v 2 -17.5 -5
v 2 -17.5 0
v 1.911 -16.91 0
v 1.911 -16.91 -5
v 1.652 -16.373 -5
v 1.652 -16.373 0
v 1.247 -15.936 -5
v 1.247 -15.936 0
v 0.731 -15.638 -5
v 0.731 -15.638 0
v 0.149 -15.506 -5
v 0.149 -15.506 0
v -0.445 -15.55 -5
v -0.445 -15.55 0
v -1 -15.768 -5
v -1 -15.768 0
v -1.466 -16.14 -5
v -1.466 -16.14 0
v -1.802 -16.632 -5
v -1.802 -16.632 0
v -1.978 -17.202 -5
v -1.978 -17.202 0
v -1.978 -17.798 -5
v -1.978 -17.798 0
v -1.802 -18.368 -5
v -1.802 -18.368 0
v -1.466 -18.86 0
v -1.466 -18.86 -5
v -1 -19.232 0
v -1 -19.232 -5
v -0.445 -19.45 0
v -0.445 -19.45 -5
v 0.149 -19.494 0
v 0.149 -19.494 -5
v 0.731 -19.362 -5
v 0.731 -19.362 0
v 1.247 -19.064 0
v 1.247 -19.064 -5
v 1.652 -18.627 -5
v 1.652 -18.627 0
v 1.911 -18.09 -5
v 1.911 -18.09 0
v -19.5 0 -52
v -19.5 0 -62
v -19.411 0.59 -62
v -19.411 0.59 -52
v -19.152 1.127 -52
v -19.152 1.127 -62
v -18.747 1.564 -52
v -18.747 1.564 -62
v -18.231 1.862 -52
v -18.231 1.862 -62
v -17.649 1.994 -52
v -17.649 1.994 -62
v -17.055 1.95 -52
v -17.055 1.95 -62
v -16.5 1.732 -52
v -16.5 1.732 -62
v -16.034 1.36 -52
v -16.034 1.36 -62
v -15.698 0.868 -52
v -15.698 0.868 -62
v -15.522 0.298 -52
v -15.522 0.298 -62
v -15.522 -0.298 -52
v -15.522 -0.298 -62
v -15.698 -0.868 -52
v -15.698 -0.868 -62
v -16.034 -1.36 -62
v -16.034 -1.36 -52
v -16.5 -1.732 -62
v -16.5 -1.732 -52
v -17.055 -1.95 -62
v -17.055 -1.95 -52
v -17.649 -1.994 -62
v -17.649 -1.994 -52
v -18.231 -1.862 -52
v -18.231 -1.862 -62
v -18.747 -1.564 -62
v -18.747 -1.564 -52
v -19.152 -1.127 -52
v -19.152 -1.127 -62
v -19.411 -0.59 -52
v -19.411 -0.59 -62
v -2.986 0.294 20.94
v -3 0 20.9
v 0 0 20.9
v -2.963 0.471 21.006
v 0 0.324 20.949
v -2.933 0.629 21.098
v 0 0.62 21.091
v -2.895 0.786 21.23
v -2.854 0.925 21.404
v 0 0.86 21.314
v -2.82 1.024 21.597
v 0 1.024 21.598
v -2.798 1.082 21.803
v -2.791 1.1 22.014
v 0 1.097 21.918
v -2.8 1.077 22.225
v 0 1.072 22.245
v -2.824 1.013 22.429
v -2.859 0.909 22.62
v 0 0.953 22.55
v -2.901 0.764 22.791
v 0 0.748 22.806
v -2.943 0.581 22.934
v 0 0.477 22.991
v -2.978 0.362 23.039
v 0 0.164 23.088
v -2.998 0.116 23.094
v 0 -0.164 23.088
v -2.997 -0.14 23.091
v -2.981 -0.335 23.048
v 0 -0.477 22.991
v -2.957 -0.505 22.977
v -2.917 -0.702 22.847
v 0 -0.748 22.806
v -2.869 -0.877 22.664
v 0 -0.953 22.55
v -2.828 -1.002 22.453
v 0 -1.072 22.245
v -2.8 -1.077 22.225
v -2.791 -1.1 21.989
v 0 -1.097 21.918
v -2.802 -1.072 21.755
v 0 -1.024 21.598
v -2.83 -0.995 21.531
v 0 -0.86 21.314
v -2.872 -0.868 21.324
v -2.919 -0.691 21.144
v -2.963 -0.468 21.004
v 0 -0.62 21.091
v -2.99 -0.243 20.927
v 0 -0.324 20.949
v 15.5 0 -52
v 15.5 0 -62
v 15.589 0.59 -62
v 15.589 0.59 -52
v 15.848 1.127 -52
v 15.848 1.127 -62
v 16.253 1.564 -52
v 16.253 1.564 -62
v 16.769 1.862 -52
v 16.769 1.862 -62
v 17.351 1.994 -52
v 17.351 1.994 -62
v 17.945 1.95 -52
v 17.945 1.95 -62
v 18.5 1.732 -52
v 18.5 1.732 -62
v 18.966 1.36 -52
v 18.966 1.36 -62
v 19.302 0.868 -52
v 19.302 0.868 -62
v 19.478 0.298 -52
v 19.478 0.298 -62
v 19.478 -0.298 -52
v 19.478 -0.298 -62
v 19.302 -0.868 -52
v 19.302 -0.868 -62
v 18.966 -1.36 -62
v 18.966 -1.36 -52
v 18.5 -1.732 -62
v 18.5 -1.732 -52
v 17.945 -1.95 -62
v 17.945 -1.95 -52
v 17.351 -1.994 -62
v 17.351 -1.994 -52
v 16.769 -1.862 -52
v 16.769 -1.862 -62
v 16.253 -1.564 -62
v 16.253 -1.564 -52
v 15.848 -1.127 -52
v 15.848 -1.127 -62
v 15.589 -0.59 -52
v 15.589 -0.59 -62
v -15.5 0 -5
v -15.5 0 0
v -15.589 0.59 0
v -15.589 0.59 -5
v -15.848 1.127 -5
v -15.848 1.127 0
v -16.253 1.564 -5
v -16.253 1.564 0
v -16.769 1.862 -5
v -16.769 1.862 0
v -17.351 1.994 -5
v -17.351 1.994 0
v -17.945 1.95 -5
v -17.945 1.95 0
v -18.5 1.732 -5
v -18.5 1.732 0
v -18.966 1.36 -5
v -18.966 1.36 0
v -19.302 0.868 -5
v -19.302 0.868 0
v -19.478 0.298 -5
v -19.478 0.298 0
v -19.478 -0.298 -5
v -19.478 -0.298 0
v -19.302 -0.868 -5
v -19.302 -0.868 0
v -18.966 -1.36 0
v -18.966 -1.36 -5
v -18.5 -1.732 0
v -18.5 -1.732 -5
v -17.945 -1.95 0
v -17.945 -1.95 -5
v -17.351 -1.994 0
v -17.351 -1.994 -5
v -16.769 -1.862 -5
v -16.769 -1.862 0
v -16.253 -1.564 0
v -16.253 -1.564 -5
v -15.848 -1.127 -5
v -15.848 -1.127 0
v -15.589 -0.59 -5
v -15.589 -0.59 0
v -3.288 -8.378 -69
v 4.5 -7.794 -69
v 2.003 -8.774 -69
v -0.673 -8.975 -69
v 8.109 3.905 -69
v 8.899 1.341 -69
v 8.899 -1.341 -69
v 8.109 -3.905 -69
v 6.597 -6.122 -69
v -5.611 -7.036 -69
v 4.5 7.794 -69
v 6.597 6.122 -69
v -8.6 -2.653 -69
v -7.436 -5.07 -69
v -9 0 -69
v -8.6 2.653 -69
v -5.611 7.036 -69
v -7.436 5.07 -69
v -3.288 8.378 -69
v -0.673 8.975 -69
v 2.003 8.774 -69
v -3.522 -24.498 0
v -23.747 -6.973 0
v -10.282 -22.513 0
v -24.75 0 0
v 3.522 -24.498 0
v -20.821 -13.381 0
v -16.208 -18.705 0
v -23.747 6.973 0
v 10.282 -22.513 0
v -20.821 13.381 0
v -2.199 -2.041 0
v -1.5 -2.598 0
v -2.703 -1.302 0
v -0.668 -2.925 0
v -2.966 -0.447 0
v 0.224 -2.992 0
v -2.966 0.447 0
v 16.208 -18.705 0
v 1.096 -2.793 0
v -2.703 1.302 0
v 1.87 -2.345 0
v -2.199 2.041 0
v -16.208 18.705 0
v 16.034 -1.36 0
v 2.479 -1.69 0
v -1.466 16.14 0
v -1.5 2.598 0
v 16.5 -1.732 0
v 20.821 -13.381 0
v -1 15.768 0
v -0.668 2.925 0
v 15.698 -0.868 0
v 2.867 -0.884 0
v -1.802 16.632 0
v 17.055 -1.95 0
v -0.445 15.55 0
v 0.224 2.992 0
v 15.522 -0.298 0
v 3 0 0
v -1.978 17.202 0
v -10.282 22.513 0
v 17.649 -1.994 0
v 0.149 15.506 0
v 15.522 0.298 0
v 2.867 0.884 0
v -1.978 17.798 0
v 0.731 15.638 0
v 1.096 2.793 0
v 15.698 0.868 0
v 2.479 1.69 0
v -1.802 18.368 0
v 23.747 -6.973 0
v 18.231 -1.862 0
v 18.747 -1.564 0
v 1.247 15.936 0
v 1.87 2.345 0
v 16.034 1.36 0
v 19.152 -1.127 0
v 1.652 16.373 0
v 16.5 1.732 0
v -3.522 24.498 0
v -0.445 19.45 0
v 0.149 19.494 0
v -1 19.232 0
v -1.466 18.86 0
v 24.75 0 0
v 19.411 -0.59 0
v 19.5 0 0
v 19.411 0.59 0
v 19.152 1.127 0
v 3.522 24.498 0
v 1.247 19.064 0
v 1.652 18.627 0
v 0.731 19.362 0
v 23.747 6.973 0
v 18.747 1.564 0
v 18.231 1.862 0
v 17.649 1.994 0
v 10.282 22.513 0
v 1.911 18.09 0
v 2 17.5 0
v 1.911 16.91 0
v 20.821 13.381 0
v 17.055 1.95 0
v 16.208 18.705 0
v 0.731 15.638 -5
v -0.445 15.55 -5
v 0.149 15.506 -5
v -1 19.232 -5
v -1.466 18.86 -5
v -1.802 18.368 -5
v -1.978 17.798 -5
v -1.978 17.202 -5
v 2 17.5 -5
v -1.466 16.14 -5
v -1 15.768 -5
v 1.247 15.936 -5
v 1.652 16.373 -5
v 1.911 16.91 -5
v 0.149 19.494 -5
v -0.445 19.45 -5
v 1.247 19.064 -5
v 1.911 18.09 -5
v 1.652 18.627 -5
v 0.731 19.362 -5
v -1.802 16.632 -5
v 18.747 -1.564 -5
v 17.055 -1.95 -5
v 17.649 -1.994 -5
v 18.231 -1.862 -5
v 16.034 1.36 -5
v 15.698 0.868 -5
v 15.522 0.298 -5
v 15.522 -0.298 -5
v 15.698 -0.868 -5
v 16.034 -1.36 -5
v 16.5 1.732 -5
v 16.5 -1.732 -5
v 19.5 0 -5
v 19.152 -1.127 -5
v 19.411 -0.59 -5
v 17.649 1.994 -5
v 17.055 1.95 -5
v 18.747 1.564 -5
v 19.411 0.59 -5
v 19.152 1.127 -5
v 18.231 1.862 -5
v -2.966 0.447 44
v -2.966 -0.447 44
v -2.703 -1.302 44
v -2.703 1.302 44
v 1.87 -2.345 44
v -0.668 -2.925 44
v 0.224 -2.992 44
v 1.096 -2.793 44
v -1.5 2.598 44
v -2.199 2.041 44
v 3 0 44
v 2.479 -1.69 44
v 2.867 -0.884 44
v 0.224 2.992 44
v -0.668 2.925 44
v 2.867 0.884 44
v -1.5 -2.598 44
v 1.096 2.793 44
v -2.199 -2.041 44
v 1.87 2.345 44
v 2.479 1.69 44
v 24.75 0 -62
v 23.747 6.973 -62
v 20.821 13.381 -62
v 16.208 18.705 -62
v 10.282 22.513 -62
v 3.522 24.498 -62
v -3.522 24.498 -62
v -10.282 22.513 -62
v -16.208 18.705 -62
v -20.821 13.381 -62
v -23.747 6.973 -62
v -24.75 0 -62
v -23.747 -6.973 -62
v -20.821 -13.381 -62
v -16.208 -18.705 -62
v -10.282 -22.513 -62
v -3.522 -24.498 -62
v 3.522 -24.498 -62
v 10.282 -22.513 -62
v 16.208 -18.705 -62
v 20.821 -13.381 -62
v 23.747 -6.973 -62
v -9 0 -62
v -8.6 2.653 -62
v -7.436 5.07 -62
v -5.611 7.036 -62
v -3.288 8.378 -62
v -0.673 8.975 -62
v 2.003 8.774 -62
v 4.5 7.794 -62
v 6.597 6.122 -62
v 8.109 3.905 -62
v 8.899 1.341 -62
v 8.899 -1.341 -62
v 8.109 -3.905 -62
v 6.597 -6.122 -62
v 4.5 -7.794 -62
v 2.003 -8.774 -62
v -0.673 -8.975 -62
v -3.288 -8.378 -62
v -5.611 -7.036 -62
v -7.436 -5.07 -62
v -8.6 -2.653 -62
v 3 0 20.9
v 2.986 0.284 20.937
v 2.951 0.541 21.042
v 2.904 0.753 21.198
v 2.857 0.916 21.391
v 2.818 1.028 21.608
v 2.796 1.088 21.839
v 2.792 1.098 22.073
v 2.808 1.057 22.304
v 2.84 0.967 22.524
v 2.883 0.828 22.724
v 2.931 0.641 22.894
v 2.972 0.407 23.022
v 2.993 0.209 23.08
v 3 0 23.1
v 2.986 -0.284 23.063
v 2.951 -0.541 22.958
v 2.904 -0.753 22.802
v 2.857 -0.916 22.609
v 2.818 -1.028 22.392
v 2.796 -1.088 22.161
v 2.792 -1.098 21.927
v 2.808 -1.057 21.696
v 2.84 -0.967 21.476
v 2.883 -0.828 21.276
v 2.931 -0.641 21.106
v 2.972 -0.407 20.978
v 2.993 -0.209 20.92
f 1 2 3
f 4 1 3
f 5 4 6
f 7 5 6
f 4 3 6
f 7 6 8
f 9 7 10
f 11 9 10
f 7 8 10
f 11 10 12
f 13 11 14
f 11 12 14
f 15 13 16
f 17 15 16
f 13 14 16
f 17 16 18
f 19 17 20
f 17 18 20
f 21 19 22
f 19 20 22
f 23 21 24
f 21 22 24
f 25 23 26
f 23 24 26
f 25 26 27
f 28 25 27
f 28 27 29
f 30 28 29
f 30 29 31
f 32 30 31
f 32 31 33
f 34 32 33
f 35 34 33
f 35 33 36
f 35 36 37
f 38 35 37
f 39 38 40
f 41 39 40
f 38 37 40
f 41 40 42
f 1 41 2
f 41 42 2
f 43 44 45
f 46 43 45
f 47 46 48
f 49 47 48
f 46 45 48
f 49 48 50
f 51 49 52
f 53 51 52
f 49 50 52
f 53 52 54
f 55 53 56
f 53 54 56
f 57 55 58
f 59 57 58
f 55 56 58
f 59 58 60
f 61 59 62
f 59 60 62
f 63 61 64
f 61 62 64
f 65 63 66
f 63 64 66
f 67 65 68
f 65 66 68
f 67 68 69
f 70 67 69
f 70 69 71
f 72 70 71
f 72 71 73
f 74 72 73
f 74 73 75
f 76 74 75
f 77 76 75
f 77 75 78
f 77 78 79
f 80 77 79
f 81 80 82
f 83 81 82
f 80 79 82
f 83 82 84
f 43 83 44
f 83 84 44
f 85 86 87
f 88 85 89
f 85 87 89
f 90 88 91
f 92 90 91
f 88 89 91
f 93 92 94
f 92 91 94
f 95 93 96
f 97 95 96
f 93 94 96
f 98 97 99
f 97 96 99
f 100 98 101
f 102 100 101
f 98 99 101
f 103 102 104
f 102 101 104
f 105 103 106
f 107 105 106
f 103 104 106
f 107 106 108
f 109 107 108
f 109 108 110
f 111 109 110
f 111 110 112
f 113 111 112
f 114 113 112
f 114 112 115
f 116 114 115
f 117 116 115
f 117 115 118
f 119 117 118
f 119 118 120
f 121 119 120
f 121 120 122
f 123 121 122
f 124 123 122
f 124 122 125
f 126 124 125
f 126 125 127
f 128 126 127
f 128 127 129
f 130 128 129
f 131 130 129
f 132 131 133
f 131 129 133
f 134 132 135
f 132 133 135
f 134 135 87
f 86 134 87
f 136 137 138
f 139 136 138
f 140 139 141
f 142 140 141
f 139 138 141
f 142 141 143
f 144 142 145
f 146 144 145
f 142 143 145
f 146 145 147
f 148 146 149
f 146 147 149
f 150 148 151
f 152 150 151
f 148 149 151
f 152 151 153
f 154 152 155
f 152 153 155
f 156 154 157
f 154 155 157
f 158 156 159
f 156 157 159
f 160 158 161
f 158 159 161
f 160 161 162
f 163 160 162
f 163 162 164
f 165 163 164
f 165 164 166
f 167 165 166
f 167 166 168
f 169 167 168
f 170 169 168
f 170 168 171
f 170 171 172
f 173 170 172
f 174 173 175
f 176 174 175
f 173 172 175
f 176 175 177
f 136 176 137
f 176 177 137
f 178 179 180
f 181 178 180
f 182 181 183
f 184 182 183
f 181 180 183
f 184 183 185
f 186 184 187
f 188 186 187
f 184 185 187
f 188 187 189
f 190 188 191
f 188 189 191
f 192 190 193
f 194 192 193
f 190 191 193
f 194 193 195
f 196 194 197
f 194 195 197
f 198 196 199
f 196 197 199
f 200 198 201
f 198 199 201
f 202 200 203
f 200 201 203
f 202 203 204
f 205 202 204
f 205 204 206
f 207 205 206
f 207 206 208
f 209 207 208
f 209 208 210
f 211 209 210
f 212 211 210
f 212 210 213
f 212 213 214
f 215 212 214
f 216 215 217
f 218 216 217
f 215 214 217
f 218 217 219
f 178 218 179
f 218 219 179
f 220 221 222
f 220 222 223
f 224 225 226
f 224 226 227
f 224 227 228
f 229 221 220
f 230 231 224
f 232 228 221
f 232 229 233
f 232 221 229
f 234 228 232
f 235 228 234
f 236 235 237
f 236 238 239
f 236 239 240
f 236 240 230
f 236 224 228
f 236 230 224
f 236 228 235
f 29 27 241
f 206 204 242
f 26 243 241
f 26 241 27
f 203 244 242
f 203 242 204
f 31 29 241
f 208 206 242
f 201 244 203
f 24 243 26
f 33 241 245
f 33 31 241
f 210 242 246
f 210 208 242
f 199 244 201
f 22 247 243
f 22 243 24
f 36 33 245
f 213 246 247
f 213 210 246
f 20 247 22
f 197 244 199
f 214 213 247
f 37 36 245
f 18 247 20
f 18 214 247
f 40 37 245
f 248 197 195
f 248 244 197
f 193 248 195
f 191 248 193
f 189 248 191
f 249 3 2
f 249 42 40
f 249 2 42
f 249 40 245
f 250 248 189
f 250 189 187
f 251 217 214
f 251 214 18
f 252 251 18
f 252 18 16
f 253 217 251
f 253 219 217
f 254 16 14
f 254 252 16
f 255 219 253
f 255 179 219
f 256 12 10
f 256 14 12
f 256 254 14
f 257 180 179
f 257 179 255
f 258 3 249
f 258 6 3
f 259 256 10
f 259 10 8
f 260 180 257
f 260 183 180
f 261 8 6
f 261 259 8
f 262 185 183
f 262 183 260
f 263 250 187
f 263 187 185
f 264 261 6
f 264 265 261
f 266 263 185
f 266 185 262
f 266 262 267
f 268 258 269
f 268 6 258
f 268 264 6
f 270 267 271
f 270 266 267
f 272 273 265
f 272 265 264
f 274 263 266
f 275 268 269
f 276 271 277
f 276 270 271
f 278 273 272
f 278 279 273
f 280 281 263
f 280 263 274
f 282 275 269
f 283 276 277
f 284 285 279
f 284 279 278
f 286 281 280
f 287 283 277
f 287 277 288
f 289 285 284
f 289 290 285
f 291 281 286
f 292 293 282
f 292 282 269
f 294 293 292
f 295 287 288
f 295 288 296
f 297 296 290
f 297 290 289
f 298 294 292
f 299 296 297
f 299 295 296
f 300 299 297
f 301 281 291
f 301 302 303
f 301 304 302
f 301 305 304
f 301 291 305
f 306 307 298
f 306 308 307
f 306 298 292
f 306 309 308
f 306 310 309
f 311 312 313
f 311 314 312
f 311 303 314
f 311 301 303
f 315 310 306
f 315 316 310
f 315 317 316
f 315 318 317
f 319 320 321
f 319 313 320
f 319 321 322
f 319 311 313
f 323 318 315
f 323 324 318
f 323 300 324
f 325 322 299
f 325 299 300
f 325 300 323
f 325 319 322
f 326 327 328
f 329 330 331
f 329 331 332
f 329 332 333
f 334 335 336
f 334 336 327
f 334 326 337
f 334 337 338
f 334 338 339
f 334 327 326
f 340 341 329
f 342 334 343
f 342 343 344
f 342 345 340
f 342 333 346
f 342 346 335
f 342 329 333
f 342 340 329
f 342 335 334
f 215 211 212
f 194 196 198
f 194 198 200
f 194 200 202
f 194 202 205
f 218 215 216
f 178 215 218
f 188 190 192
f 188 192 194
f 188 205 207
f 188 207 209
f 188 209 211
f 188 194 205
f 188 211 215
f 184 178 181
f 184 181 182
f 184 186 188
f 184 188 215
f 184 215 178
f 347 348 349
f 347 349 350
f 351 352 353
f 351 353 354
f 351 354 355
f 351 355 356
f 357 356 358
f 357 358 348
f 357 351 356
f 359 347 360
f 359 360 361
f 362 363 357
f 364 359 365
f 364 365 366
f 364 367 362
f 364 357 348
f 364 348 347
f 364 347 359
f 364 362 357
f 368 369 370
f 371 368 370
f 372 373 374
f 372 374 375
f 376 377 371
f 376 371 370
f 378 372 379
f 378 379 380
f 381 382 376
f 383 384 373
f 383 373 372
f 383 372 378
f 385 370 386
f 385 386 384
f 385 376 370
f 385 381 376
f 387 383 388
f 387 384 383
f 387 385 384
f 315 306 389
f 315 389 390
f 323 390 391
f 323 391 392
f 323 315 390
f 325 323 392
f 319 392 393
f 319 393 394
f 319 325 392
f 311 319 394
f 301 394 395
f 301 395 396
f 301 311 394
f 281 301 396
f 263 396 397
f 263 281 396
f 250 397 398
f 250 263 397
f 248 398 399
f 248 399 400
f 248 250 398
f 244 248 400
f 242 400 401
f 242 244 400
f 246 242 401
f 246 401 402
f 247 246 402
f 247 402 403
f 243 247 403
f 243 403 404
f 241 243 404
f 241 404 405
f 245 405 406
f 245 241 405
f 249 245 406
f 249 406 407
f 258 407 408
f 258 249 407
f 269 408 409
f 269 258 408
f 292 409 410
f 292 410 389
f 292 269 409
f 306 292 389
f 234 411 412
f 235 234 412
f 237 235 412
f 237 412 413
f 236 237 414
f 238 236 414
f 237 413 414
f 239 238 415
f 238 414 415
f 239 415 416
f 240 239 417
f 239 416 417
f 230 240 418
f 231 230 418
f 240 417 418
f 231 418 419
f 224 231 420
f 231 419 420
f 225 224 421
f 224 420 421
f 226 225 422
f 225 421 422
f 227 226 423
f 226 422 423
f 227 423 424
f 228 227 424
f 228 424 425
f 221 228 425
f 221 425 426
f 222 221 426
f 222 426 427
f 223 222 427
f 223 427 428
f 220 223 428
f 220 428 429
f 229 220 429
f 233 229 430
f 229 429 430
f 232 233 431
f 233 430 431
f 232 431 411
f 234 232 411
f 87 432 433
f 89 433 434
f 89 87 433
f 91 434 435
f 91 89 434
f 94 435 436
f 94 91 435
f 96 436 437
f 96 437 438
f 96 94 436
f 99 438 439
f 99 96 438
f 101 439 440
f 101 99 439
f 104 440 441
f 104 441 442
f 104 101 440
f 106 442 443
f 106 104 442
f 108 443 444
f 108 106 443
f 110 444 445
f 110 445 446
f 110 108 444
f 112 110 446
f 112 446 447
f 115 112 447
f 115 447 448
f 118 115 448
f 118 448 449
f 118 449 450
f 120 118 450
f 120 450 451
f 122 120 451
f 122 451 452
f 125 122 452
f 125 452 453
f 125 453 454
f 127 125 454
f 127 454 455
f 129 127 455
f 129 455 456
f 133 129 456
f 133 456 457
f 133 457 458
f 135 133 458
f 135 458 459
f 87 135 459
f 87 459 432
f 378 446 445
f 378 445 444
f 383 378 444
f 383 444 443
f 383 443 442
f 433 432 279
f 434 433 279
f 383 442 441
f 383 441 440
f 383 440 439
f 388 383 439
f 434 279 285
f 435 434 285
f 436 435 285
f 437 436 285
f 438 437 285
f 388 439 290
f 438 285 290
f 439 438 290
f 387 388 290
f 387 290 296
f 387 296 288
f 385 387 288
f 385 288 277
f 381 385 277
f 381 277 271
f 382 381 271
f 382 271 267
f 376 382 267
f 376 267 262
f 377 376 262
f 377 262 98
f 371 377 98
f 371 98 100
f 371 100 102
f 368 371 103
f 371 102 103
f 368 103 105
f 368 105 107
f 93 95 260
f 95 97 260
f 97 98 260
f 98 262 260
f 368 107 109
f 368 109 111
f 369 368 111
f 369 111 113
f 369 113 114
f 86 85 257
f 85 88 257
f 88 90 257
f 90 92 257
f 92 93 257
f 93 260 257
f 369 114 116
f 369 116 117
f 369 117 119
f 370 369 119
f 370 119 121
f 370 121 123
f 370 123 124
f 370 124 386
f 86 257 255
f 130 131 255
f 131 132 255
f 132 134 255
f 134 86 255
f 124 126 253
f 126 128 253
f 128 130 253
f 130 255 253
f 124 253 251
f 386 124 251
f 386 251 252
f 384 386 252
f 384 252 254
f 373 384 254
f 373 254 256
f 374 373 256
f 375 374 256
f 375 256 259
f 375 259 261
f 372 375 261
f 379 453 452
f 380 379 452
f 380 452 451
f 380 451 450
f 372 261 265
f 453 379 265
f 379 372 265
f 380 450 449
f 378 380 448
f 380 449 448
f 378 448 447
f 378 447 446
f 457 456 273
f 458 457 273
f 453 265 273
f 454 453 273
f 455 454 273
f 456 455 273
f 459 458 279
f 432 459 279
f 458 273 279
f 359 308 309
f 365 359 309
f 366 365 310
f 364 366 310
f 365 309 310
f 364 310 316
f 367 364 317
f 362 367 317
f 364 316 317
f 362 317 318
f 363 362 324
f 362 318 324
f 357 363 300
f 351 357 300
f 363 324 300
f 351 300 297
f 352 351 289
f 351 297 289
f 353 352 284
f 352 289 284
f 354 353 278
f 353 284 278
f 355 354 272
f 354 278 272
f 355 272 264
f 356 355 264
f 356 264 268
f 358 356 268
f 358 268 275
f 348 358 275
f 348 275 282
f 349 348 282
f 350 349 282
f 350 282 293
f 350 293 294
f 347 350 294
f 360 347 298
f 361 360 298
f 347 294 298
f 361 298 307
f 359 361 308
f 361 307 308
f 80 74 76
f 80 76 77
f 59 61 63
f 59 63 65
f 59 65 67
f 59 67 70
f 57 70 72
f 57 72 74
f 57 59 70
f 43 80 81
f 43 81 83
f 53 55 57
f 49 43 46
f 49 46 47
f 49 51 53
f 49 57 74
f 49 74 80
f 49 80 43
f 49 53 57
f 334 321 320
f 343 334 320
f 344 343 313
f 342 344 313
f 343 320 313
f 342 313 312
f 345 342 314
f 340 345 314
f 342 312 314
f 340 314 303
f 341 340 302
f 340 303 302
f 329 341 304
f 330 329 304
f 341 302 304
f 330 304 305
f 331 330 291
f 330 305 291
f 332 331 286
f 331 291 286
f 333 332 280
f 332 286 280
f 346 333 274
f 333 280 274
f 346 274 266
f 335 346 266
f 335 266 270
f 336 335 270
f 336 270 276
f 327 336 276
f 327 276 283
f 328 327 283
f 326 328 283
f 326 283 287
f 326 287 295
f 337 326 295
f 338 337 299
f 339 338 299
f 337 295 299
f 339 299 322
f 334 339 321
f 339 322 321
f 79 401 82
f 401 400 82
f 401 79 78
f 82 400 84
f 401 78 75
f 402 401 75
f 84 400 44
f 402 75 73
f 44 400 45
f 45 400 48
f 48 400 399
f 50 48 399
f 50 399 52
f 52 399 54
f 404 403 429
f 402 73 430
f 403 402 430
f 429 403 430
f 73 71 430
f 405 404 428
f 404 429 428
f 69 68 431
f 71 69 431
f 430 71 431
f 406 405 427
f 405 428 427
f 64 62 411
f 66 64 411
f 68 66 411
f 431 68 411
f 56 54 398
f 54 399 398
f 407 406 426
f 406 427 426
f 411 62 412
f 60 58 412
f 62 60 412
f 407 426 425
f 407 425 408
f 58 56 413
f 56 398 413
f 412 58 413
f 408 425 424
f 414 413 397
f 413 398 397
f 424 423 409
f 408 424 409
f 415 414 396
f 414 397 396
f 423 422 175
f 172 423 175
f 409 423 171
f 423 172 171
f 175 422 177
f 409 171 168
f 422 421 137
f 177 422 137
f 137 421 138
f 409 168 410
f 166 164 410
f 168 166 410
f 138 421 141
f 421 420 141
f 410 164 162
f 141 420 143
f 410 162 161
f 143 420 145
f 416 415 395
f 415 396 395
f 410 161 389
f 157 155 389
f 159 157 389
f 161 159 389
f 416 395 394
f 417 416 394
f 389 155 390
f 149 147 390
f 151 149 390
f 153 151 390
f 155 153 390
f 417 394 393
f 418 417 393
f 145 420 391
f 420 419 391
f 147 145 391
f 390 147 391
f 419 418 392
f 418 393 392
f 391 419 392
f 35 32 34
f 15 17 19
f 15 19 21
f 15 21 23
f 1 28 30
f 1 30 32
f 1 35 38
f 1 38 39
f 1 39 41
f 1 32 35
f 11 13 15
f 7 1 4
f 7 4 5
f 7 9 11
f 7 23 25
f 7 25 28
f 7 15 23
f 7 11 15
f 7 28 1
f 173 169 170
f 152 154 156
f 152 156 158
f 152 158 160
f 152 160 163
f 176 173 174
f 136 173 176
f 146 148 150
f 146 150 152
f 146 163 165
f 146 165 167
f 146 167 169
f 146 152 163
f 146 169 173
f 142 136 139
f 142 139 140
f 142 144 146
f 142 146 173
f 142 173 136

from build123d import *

# Parameters (mm, degrees)
SKETCH1_R               = 24.75
BOSS_EXTRUDE1_DEPTH     = 62
SKETCH2_R               = 3
BOSS_EXTRUDE2_DEPTH     = 44
SKETCH3_R               = 1.1
CUT_EXTRUDE1_DEPTH      = 25.75
CUT_EXTRUDE1_DEPTH_BACK = 25.75
SKETCH4_R               = 9
BOSS_EXTRUDE3_DEPTH     = 7
SKETCH5_R               = 2
CUT_EXTRUDE2_DEPTH      = 10
SKETCH6_R               = 2
CUT_EXTRUDE3_DEPTH      = 5


with BuildPart() as part:
    # Sketch1 → Boss-Extrude1 (new body)
    with BuildSketch(Plane.XY):
        Circle(SKETCH1_R)
    extrude(amount=-BOSS_EXTRUDE1_DEPTH)

    # Sketch2 → Boss-Extrude2 (add)
    with BuildSketch(Plane.XY):
        Circle(SKETCH2_R)
    extrude(amount=BOSS_EXTRUDE2_DEPTH)

    # Sketch3 → Cut-Extrude1 (cut, two sides)
    with BuildSketch(Plane(origin=(0, 0, 0), x_dir=(0, 0, -1), z_dir=(1, 0, 0))) as cut_extrude1_sk:
        with Locations((-22, 0)):
            Circle(SKETCH3_R)
    extrude(amount=CUT_EXTRUDE1_DEPTH, mode=Mode.SUBTRACT)
    extrude(cut_extrude1_sk.sketch, amount=-CUT_EXTRUDE1_DEPTH_BACK, mode=Mode.SUBTRACT)

    # Sketch4 → Boss-Extrude3 (add)
    with BuildSketch(Plane(origin=(0, 0, -62), x_dir=(-1, 0, 0), z_dir=(0, 0, -1))):
        Circle(SKETCH4_R)
    extrude(amount=BOSS_EXTRUDE3_DEPTH)

    # Sketch5 → Cut-Extrude2 (cut)
    with BuildSketch(Plane(origin=(0, 0, -62), x_dir=(-1, 0, 0), z_dir=(0, 0, -1))):
        with Locations((-17.5, 0)):
            Circle(SKETCH5_R)
        with Locations((17.5, 0)):
            Circle(SKETCH5_R)
    extrude(amount=-CUT_EXTRUDE2_DEPTH, mode=Mode.SUBTRACT)

    # Sketch6 → Cut-Extrude3 (cut)
    with BuildSketch(Plane.XY):
        with Locations((0, 17.5)):
            Circle(SKETCH6_R)
        with Locations((17.5, 0)):
            Circle(SKETCH6_R)
        with Locations((0, -17.5)):
            Circle(SKETCH6_R)
        with Locations((-17.5, 0)):
            Circle(SKETCH6_R)
    extrude(amount=-CUT_EXTRUDE3_DEPTH, mode=Mode.SUBTRACT)


solid = part.part
